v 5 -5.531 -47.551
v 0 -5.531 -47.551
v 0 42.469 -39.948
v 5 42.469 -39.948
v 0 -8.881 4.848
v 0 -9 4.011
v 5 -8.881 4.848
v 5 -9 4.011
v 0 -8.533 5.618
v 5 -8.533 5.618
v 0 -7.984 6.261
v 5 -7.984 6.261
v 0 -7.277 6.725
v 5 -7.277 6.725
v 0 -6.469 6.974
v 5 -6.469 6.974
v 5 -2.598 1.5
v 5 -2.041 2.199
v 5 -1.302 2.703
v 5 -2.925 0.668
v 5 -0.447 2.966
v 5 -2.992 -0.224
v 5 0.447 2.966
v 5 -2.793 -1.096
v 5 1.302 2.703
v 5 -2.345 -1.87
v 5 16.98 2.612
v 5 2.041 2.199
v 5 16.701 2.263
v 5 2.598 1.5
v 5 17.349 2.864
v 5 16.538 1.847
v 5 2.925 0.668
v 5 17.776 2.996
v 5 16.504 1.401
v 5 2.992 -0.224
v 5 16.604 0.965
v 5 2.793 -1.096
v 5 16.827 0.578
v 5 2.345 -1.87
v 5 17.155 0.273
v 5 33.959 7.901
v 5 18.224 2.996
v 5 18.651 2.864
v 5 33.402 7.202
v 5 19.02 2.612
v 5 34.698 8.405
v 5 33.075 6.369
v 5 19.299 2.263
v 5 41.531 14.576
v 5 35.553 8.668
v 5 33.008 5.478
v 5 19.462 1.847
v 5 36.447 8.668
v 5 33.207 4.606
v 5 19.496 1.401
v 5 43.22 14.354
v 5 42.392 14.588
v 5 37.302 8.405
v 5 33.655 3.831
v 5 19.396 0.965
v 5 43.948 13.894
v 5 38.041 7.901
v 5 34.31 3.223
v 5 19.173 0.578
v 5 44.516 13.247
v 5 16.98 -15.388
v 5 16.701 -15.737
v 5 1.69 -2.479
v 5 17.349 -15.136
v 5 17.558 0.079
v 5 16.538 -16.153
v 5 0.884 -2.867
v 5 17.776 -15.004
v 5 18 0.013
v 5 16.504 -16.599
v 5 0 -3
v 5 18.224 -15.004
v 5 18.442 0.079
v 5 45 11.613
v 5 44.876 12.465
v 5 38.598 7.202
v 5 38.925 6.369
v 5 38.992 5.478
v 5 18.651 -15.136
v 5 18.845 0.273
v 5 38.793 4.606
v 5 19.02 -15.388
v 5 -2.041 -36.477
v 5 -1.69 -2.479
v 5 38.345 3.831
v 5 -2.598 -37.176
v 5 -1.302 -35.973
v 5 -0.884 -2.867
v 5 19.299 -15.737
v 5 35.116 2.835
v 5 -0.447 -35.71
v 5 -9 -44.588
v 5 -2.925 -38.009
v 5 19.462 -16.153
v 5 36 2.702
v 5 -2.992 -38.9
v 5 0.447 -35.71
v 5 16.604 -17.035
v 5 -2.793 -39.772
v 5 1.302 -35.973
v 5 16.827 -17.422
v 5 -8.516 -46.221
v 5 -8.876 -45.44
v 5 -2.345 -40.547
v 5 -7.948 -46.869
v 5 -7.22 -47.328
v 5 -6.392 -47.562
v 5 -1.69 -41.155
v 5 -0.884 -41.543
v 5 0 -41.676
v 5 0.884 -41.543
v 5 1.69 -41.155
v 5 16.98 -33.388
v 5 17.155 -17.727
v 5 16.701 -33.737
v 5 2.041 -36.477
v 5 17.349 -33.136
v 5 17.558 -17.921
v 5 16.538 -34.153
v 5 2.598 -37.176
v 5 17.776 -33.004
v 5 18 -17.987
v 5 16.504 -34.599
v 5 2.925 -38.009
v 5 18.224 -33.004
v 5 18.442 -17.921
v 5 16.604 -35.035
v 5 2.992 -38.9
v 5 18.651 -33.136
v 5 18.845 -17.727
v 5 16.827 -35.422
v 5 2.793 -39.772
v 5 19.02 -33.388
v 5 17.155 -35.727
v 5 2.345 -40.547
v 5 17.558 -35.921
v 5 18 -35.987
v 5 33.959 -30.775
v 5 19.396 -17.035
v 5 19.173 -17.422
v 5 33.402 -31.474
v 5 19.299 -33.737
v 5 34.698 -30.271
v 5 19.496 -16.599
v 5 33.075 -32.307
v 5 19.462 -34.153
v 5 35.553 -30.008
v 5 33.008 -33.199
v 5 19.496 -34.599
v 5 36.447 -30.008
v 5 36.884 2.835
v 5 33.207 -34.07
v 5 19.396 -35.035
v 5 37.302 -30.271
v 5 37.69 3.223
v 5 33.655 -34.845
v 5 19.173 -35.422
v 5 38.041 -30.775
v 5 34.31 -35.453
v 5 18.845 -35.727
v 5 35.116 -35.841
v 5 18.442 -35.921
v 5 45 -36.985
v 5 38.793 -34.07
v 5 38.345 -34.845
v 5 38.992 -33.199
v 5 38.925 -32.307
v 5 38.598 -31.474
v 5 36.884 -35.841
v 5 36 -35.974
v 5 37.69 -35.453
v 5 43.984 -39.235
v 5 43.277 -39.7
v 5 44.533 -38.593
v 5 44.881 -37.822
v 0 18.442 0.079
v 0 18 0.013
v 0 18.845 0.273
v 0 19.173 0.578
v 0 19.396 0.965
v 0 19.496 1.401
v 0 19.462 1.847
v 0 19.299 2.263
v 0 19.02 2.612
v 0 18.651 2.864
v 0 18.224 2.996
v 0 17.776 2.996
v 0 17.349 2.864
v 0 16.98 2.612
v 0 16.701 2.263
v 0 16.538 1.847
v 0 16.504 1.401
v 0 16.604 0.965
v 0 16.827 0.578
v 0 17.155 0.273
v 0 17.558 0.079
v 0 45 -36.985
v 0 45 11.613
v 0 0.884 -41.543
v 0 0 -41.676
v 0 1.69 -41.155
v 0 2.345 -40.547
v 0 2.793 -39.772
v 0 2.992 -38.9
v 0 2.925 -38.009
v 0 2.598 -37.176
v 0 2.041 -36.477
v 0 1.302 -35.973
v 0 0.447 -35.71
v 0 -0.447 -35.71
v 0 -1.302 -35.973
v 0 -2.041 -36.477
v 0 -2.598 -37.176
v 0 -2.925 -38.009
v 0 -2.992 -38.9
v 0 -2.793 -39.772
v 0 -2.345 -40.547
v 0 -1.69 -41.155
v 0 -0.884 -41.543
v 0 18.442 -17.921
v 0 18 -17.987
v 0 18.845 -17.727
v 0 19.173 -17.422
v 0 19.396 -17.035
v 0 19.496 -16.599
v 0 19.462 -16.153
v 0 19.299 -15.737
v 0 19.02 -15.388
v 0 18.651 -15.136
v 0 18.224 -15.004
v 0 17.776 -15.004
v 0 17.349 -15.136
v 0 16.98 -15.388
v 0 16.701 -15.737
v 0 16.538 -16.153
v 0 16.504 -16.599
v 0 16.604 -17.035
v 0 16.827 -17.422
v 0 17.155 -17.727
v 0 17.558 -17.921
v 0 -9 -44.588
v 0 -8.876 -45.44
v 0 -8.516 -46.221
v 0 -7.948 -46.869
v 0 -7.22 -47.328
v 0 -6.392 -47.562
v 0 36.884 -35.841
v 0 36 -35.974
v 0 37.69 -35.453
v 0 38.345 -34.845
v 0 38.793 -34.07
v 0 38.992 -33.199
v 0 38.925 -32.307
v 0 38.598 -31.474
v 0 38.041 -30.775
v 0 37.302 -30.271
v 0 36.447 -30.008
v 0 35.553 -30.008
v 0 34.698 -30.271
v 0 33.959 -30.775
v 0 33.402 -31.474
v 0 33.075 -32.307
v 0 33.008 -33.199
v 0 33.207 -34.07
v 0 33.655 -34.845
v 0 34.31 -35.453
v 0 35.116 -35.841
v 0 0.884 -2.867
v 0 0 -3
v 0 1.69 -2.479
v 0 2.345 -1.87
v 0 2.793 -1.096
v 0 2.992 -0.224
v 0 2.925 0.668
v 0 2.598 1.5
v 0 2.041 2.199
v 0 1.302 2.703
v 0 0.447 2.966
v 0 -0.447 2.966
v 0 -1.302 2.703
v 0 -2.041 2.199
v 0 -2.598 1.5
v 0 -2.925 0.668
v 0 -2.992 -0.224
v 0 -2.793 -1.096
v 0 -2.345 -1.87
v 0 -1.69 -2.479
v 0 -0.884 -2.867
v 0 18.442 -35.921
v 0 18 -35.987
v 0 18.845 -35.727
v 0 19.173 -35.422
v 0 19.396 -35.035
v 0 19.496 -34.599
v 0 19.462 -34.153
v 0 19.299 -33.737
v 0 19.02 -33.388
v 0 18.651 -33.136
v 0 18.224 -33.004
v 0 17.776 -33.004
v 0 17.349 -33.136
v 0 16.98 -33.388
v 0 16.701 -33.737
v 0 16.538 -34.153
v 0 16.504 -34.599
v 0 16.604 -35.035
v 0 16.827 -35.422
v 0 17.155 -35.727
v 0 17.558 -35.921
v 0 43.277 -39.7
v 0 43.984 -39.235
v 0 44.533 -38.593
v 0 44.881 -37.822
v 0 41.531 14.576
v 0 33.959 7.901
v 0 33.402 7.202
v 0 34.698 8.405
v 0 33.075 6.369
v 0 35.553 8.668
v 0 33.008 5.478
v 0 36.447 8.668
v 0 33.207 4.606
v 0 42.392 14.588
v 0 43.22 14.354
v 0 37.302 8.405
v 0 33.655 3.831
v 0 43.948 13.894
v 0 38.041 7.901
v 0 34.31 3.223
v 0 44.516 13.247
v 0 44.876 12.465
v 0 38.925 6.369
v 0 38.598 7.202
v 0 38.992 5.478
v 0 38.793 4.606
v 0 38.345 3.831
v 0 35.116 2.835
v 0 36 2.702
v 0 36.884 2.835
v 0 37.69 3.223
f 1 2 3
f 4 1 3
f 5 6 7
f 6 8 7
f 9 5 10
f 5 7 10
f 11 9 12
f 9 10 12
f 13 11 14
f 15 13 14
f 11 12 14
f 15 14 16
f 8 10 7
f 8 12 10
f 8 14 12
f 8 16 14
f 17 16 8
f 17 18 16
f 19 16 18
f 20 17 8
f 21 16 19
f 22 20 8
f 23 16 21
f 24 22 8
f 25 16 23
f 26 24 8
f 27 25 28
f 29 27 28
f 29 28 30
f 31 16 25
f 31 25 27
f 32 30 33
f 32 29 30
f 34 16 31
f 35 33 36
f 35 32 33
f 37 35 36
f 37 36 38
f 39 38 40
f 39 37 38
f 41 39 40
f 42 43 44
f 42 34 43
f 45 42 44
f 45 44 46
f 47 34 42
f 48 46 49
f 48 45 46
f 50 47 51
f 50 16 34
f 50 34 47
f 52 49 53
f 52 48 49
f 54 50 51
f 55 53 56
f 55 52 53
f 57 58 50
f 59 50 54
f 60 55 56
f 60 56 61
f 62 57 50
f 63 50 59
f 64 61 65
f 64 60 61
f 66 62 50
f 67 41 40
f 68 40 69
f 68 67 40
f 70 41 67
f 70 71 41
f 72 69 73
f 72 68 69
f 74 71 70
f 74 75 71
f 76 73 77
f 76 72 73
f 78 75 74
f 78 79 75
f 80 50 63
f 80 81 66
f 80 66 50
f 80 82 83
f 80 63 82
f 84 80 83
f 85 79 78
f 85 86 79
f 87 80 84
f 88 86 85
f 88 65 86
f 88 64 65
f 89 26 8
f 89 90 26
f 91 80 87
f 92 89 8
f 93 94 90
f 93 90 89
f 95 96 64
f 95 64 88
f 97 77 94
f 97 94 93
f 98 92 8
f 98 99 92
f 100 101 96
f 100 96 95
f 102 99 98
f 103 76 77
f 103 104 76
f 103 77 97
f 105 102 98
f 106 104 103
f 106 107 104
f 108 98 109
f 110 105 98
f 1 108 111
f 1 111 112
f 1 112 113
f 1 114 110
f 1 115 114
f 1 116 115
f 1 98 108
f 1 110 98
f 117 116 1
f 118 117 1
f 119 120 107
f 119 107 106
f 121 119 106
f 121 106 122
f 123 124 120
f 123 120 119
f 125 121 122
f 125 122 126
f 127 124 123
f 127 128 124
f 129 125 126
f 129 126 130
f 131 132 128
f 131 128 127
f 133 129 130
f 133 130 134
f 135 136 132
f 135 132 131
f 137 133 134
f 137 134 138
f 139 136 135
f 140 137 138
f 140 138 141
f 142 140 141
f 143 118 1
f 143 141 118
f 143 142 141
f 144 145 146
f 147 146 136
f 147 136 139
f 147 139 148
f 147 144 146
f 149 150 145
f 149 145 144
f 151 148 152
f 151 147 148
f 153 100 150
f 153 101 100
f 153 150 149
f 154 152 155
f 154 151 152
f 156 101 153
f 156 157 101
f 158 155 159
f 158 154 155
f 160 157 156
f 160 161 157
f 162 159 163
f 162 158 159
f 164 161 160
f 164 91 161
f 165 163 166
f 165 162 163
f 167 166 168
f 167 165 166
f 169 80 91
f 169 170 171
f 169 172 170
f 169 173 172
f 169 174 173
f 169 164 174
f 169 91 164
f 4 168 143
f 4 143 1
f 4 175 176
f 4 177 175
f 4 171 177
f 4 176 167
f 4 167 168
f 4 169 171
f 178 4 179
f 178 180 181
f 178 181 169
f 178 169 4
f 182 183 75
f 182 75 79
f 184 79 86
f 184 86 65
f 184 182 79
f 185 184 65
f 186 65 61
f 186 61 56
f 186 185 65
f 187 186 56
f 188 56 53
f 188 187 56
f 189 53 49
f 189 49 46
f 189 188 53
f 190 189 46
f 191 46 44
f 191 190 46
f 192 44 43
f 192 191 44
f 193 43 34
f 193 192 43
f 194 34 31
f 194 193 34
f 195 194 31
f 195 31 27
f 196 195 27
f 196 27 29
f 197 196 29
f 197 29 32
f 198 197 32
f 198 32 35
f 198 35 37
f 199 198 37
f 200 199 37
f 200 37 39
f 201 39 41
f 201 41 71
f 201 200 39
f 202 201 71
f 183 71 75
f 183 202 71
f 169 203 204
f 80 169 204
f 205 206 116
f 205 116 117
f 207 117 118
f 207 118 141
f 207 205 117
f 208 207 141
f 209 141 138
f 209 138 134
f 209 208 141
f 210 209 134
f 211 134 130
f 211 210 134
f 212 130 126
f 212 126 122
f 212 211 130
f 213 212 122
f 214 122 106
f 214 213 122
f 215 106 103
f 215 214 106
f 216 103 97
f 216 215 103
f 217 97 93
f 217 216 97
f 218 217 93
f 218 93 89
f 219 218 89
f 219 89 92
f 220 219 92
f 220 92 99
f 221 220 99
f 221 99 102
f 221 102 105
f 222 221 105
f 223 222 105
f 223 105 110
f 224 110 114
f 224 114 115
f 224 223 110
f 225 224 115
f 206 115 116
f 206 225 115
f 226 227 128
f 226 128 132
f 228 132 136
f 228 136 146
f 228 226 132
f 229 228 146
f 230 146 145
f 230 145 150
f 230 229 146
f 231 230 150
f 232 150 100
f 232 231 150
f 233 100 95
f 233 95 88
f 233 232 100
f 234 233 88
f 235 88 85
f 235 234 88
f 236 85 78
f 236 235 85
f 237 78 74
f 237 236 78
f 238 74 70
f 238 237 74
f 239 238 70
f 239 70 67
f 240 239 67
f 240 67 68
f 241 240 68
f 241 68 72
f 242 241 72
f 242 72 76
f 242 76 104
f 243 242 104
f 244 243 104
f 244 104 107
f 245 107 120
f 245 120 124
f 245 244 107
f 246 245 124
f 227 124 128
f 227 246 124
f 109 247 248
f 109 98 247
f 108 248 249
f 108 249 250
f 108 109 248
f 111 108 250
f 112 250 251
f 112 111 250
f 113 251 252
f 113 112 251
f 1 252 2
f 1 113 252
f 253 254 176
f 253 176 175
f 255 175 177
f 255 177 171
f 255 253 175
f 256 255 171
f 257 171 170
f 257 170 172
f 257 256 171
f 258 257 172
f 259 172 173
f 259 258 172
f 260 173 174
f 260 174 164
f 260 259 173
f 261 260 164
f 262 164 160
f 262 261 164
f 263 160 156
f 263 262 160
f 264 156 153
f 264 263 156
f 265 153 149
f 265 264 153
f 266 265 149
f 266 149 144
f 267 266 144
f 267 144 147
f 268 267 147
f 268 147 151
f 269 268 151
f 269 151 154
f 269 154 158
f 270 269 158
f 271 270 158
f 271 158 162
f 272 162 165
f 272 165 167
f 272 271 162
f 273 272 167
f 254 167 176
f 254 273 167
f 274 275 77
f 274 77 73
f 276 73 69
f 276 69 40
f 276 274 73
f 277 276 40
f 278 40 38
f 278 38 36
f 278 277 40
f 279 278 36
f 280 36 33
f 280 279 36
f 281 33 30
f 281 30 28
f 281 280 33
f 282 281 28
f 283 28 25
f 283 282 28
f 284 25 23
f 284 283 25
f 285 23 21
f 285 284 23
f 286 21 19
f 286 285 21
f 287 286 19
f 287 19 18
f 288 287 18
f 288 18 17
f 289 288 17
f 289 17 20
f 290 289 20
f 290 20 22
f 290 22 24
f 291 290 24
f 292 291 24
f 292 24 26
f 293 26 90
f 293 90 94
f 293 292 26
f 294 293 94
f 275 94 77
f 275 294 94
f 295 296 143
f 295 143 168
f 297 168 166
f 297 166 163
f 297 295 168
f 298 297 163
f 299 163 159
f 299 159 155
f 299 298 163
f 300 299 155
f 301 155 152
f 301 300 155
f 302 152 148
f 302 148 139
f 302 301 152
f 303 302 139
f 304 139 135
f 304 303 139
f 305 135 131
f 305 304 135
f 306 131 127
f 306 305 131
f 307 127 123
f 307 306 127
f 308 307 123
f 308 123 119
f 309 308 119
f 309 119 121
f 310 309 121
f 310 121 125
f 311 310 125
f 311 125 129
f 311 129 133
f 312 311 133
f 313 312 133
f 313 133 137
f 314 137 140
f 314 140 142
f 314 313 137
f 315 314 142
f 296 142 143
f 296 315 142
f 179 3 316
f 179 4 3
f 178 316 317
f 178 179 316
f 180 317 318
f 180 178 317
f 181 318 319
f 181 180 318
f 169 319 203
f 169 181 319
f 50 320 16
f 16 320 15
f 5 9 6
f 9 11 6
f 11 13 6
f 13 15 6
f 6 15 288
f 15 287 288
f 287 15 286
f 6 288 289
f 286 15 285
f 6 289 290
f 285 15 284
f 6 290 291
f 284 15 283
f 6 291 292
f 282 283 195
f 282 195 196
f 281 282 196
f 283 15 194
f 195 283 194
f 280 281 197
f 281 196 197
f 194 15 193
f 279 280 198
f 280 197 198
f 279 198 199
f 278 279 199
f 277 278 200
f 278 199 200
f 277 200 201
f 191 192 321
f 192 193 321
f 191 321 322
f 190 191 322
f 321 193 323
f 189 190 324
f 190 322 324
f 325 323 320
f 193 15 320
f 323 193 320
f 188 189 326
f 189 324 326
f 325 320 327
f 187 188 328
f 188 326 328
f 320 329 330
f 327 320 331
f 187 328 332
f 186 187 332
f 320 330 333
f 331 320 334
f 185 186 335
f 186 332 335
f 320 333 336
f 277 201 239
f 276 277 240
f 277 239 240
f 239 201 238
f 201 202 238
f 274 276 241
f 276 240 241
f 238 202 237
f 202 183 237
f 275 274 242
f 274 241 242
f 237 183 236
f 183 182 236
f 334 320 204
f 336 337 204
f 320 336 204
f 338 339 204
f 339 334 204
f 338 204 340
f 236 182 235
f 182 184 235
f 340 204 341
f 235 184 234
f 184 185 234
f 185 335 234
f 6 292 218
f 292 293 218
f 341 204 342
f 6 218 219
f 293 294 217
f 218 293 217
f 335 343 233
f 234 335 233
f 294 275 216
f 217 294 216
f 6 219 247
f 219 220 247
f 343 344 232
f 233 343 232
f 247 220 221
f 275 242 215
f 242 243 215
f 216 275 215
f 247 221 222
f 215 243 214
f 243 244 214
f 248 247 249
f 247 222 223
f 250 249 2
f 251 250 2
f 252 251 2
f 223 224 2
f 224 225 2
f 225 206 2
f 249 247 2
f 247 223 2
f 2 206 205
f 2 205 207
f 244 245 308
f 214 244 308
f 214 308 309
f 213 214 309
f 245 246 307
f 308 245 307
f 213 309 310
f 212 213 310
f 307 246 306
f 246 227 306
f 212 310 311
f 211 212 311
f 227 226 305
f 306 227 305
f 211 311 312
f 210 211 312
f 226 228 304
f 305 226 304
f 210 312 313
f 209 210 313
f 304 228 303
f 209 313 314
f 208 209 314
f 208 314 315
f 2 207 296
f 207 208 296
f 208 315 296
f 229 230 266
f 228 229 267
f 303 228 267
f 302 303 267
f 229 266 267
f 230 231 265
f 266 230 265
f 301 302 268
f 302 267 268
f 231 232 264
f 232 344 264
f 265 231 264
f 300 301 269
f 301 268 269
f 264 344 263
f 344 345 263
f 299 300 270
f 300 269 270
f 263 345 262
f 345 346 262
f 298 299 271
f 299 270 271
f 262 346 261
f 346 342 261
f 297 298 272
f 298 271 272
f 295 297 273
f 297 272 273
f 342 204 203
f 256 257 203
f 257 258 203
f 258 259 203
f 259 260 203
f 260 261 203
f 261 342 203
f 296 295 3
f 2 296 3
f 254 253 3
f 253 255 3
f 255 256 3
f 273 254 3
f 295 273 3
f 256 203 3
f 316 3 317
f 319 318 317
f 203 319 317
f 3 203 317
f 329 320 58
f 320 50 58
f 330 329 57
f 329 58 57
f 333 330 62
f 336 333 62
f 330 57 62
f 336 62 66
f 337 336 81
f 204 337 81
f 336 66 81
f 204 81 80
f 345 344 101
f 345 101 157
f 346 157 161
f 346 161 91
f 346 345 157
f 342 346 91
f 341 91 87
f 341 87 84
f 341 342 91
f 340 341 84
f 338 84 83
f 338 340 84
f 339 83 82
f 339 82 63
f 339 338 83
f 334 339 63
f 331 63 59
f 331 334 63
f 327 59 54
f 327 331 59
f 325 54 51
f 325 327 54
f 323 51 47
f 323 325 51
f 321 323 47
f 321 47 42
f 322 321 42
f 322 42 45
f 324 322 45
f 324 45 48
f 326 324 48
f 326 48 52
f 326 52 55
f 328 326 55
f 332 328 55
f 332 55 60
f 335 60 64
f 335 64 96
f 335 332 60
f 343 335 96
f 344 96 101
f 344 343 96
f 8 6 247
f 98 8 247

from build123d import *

# Parameters (mm, degrees)
SKETCH1_R           = 3
SKETCH1_R_2         = 1.5
BOSS_EXTRUDE1_DEPTH = 5
FILLET1_R           = 3


with BuildPart() as part:
    # Sketch1 → Boss-Extrude1 (new body)
    with BuildSketch(Plane(origin=(0, 0, 0), x_dir=(0, 0, -1), z_dir=(1, 0, 0))):
        Polygon((-6.573014531, -9), (48.100102262, -9), (39.547342484, 45), (-15.125774308, 45), align=None)
        Circle(SKETCH1_R, mode=Mode.SUBTRACT)
        with Locations((38.676167805, 0)):
            Circle(SKETCH1_R, mode=Mode.SUBTRACT)
        with Locations((-5.701839852, 36)):
            Circle(SKETCH1_R, mode=Mode.SUBTRACT)
        with Locations((32.974327953, 36)):
            Circle(SKETCH1_R, mode=Mode.SUBTRACT)
        with Locations((16.487163977, 18)):
            Circle(SKETCH1_R_2, mode=Mode.SUBTRACT)
        with Locations((-1.512836023, 18)):
            Circle(SKETCH1_R_2, mode=Mode.SUBTRACT)
        with Locations((34.487163977, 18)):
            Circle(SKETCH1_R_2, mode=Mode.SUBTRACT)
    extrude(amount=BOSS_EXTRUDE1_DEPTH)

    # Fillet1
    fillet1_edges = [part.edges().sort_by_distance(p)[0] for p in [
        (2.5, 45, 15.125774308),
        (2.5, 45, -39.547342484),
        (2.5, -9, -48.100102262),
        (2.5, -9, 6.573014531),
    ]]
    fillet(fillet1_edges, radius=FILLET1_R)


solid = part.part
